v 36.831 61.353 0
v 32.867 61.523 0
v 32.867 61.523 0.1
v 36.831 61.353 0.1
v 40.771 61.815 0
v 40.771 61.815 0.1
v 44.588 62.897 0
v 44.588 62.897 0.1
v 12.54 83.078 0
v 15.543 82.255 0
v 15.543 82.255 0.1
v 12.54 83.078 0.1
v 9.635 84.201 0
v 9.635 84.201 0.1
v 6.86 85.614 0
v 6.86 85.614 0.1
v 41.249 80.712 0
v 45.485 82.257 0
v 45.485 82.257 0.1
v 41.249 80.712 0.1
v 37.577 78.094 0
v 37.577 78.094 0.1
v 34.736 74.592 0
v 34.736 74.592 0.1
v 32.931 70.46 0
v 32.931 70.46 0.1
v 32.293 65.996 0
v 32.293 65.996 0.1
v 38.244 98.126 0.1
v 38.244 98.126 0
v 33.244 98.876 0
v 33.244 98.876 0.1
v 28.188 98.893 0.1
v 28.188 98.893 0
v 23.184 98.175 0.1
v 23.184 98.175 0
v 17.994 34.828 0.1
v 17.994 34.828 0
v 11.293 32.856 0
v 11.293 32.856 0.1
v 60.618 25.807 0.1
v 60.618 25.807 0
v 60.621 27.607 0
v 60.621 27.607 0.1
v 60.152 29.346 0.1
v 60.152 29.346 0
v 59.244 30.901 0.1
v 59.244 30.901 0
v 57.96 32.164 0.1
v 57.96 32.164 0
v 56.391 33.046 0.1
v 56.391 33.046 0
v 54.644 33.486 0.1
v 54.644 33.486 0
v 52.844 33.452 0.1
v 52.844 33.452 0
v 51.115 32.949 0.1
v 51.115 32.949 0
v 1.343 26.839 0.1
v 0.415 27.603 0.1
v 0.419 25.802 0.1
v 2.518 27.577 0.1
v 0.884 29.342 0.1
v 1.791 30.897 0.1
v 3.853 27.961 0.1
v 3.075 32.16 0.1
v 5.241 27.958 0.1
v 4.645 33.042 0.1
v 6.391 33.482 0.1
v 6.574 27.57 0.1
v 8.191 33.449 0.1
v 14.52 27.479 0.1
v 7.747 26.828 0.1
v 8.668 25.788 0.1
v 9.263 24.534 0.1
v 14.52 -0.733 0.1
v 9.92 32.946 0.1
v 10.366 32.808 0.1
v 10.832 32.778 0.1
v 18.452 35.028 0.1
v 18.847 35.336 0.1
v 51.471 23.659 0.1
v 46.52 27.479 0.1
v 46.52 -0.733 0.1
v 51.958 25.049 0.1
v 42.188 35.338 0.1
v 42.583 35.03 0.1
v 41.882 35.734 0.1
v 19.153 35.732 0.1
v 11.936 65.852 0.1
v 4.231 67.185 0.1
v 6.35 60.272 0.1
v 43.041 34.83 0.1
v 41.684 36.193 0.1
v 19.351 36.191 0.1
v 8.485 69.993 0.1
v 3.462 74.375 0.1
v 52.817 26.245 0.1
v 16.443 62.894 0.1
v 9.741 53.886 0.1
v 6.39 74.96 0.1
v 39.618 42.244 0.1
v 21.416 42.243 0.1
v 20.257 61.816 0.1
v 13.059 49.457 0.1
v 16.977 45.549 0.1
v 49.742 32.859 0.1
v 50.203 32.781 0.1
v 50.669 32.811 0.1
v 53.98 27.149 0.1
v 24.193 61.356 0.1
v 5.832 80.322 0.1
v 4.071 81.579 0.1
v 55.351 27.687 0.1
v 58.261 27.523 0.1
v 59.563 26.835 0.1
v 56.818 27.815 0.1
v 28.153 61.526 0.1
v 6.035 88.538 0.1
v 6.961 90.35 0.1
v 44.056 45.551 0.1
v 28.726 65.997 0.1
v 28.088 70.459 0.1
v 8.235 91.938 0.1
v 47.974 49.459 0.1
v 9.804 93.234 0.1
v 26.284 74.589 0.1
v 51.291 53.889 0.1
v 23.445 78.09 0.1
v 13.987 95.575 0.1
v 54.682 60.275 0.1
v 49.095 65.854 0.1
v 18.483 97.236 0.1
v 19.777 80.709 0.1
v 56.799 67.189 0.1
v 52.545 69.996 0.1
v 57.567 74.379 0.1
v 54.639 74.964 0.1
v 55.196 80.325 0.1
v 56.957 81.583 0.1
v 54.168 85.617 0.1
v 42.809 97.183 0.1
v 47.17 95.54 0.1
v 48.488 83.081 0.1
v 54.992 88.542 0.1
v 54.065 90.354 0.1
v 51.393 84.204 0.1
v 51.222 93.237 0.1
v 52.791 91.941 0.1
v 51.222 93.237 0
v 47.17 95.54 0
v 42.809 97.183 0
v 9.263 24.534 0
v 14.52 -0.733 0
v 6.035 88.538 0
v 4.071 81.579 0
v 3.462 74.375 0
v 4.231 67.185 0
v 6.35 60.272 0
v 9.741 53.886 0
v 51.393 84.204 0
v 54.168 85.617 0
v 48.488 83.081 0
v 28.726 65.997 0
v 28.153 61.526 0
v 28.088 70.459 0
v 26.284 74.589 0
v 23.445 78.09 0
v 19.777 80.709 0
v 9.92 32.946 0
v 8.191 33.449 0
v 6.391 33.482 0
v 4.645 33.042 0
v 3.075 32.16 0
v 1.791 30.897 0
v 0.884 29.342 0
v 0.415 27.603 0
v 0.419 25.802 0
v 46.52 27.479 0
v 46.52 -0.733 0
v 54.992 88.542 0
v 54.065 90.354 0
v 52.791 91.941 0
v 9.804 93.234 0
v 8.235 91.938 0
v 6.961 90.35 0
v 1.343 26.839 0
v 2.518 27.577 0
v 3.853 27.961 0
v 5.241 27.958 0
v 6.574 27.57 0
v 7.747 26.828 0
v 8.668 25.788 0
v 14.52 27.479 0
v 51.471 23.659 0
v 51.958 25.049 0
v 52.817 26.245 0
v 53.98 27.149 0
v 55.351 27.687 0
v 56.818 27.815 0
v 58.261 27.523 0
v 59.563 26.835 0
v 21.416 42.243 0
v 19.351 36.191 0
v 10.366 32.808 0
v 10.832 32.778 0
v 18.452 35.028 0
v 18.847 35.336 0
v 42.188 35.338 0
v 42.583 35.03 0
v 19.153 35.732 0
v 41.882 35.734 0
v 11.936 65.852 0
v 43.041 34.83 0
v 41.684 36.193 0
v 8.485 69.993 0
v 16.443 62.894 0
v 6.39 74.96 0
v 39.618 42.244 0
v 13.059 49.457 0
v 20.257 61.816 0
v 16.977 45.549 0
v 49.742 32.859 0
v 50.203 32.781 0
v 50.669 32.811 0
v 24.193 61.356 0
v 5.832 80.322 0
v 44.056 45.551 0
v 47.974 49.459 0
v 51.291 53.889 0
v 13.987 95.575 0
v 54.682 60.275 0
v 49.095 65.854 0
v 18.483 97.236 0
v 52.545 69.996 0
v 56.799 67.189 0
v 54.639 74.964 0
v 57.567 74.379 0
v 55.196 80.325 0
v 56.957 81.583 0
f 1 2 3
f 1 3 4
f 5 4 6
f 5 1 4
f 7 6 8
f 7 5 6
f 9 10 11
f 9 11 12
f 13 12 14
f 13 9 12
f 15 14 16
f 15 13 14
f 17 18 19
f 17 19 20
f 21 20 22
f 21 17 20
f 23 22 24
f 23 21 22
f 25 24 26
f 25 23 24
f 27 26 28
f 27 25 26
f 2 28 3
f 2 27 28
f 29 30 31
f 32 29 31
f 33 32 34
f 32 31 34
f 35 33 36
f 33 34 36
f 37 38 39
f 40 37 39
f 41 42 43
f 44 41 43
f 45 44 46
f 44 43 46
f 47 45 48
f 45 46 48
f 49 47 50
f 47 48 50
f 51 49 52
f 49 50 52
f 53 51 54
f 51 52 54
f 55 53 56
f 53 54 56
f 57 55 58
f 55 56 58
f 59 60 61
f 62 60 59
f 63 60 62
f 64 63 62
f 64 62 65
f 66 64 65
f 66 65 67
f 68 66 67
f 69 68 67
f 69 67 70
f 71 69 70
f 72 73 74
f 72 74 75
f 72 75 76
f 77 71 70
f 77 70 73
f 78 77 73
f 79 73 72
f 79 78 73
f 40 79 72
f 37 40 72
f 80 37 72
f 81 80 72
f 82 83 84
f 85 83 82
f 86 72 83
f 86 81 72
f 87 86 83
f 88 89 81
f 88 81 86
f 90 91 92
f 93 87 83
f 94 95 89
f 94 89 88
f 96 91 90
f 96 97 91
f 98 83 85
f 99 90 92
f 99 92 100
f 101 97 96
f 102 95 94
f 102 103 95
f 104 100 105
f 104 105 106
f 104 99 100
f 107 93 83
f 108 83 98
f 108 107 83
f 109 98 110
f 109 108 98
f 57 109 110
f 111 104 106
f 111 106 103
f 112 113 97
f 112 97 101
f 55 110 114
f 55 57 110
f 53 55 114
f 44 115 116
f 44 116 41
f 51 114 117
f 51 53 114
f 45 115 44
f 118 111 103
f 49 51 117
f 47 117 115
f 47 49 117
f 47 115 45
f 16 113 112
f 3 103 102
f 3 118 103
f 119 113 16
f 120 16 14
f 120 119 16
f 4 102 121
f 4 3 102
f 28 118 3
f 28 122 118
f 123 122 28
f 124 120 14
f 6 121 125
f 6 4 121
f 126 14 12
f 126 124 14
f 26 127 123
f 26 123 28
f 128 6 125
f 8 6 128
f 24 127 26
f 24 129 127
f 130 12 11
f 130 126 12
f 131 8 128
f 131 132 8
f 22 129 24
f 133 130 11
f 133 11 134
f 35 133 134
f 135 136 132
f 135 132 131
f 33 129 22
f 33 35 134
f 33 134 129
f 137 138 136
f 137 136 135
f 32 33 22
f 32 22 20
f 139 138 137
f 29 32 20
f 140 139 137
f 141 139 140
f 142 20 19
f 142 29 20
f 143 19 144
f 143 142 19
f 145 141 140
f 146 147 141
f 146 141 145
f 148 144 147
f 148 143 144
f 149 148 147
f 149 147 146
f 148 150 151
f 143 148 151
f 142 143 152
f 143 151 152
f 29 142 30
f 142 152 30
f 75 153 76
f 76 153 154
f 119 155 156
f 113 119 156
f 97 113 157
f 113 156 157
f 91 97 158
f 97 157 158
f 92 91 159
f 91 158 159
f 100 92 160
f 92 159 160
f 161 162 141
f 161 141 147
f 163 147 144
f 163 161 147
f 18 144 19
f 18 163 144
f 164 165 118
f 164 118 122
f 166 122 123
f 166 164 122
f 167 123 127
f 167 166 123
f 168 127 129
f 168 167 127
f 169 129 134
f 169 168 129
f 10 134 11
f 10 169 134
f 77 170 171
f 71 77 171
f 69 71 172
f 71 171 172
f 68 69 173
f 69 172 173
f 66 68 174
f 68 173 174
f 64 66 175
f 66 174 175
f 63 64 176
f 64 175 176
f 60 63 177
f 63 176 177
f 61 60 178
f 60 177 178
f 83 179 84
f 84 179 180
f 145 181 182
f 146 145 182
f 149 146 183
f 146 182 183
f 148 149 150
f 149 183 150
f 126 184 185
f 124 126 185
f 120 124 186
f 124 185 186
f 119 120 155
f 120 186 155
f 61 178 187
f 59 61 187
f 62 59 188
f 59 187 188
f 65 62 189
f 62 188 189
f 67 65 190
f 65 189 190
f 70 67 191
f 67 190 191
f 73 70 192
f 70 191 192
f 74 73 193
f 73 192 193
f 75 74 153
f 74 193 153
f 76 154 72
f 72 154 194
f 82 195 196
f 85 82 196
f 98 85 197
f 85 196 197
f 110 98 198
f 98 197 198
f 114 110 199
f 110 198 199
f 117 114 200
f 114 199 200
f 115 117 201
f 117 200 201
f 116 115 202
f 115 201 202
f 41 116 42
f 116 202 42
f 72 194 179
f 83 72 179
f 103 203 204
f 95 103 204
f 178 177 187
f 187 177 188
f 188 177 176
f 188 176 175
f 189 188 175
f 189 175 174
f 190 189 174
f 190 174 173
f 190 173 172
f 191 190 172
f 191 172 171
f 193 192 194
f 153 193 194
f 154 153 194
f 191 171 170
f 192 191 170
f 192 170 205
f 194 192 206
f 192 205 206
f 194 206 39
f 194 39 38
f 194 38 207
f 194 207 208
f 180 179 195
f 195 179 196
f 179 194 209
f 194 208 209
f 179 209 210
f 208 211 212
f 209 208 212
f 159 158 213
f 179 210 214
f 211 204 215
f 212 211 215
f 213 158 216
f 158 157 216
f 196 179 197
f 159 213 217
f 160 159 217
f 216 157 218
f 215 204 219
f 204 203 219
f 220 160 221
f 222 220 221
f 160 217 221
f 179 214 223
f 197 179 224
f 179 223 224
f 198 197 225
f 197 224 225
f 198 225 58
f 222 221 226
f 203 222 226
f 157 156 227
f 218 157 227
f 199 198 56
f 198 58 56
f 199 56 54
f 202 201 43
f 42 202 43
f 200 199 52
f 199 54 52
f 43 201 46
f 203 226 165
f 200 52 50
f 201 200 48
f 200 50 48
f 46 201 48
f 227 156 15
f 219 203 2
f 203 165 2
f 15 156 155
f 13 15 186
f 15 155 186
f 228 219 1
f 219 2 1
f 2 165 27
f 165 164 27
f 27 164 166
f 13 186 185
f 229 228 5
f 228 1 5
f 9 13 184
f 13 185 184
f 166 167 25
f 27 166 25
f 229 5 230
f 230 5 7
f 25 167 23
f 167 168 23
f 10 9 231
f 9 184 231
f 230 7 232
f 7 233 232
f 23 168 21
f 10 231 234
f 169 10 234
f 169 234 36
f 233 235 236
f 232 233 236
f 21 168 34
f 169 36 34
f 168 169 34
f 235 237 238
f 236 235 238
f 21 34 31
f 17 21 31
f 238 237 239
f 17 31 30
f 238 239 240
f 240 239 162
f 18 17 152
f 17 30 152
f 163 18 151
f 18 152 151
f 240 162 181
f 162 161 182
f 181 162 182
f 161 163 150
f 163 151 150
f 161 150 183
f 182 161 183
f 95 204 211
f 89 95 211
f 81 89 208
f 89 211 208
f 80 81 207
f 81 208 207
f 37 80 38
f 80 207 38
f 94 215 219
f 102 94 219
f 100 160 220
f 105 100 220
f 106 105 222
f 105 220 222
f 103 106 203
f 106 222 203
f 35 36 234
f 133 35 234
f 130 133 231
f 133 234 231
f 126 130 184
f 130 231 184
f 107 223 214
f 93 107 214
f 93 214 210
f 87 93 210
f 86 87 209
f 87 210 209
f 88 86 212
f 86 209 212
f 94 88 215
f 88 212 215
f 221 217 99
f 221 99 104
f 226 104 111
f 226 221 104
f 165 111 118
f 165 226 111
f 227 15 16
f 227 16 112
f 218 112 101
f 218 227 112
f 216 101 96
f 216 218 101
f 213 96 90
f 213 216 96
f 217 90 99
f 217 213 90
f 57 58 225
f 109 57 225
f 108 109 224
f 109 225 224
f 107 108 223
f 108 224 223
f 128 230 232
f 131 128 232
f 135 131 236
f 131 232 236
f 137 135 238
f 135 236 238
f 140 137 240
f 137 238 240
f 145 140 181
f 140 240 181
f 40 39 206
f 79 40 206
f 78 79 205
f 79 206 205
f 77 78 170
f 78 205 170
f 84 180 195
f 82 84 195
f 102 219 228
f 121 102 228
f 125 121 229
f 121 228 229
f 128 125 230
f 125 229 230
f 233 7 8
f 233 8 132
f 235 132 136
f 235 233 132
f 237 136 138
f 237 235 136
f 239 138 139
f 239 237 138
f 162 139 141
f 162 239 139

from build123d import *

# Parameters (mm, degrees)
SALIENTE_EXTRUIR1_DEPTH = 0.1


with BuildPart() as part:
    # Model → Saliente-Extruir1 (new body)
    with BuildSketch(Plane.XY):
        with BuildLine():
            Line((14.520286295, 27.479285465), (30.020286295, 27.479285465))
            Line((30.020286295, 27.479285465), (30.995526762, 27.479285465))
            Line((30.995526762, 27.479285465), (46.520286295, 27.479285465))
            Line((46.520286295, 27.479285465), (46.520286295, -0.733231614))
            Line((46.520286295, -0.733231614), (51.471061016, 23.659269995))
            ThreePointArc((51.471061016, 23.659269995), (55.350844588, 27.68663731), (60.617590106, 25.806796971))
            ThreePointArc((60.617590106, 25.806796971), (57.96035452, 32.1636369), (51.115344163, 32.948587895))
            ThreePointArc((51.115344163, 32.948587895), (50.436854059, 32.782110426), (49.742499175, 32.859148502))
            Line((49.742499175, 32.859148502), (43.04104749, 34.830163703))
            ThreePointArc((43.04104749, 34.830163703), (42.188067529, 35.337786997), (41.684191584, 36.192985954))
            Line((41.684191584, 36.192985954), (39.61828219, 42.24428199))
            ThreePointArc((39.61828219, 42.24428199), (46.085307041, 47.434632953), (51.291287848, 53.889082378))
            ThreePointArc((51.291287848, 53.889082378), (57.354652208, 70.765408557), (54.99199246, 88.541589574))
            ThreePointArc((54.99199246, 88.541589574), (53.468862534, 91.179848081), (51.222076914, 93.237100398))
            ThreePointArc((51.222076914, 93.237100398), (45.021608732, 96.446811627), (38.244470176, 98.125634086))
            ThreePointArc((38.244470176, 98.125634086), (30.716762072, 98.976544856), (23.183606681, 98.175290659))
            ThreePointArc((23.183606681, 98.175290659), (16.202528521, 96.493815521), (9.804335921, 93.234069768))
            ThreePointArc((9.804335921, 93.234069768), (7.557851393, 91.176488668), (6.035107577, 88.538007288))
            ThreePointArc((6.035107577, 88.538007288), (3.675049302, 70.761480699), (9.740883355, 53.886042041))
            ThreePointArc((9.740883355, 53.886042041), (14.947788987, 47.432374192), (21.41554616, 42.242979995))
            Line((21.41554616, 42.242979995), (19.35050339, 36.191373826))
            ThreePointArc((19.35050339, 36.191373826), (18.846750914, 35.336102135), (17.993844246, 34.828355703))
            Line((17.993844246, 34.828355703), (11.292677181, 32.856373051))
            ThreePointArc((11.292677181, 32.856373051), (10.598333426, 32.779234734), (9.919819295, 32.945614249))
            ThreePointArc((9.919819295, 32.945614249), (3.074922331, 32.159675066), (0.418604493, 25.802451585))
            ThreePointArc((0.418604493, 25.802451585), (5.241056245, 27.958298833), (9.263373954, 24.534167044))
            Line((9.263373954, 24.534167044), (14.520286295, -0.733231614))
            Line((14.520286295, -0.733231614), (14.520286295, 27.479285465))
        make_face()
        with BuildLine():
            ThreePointArc((28.153211973, 61.525805428), (26.284358187, 74.589260971), (15.542822199, 82.255152297))
            ThreePointArc((15.542822199, 82.255152297), (11.073088945, 83.602659269), (6.85998466, 85.613639796))
            ThreePointArc((6.85998466, 85.613639796), (7.253715162, 72.399202471), (16.442622696, 62.89444809))
            ThreePointArc((16.442622696, 62.89444809), (22.215756006, 61.507125455), (28.153211973, 61.525805428))
        make_face(mode=Mode.SUBTRACT)
        with BuildLine():
            ThreePointArc((32.866716238, 61.523161648), (38.809998945, 61.505477347), (44.588230247, 62.896507568))
            ThreePointArc((44.588230247, 62.896507568), (53.775746714, 72.402606594), (54.167543352, 85.617101397))
            ThreePointArc((54.167543352, 85.617101397), (49.954733408, 83.605504327), (45.485197402, 82.257343249))
            ThreePointArc((45.485197402, 82.257343249), (34.736372016, 74.592110583), (32.866716238, 61.523161648))
        make_face(mode=Mode.SUBTRACT)
    extrude(amount=SALIENTE_EXTRUIR1_DEPTH)


solid = part.part
